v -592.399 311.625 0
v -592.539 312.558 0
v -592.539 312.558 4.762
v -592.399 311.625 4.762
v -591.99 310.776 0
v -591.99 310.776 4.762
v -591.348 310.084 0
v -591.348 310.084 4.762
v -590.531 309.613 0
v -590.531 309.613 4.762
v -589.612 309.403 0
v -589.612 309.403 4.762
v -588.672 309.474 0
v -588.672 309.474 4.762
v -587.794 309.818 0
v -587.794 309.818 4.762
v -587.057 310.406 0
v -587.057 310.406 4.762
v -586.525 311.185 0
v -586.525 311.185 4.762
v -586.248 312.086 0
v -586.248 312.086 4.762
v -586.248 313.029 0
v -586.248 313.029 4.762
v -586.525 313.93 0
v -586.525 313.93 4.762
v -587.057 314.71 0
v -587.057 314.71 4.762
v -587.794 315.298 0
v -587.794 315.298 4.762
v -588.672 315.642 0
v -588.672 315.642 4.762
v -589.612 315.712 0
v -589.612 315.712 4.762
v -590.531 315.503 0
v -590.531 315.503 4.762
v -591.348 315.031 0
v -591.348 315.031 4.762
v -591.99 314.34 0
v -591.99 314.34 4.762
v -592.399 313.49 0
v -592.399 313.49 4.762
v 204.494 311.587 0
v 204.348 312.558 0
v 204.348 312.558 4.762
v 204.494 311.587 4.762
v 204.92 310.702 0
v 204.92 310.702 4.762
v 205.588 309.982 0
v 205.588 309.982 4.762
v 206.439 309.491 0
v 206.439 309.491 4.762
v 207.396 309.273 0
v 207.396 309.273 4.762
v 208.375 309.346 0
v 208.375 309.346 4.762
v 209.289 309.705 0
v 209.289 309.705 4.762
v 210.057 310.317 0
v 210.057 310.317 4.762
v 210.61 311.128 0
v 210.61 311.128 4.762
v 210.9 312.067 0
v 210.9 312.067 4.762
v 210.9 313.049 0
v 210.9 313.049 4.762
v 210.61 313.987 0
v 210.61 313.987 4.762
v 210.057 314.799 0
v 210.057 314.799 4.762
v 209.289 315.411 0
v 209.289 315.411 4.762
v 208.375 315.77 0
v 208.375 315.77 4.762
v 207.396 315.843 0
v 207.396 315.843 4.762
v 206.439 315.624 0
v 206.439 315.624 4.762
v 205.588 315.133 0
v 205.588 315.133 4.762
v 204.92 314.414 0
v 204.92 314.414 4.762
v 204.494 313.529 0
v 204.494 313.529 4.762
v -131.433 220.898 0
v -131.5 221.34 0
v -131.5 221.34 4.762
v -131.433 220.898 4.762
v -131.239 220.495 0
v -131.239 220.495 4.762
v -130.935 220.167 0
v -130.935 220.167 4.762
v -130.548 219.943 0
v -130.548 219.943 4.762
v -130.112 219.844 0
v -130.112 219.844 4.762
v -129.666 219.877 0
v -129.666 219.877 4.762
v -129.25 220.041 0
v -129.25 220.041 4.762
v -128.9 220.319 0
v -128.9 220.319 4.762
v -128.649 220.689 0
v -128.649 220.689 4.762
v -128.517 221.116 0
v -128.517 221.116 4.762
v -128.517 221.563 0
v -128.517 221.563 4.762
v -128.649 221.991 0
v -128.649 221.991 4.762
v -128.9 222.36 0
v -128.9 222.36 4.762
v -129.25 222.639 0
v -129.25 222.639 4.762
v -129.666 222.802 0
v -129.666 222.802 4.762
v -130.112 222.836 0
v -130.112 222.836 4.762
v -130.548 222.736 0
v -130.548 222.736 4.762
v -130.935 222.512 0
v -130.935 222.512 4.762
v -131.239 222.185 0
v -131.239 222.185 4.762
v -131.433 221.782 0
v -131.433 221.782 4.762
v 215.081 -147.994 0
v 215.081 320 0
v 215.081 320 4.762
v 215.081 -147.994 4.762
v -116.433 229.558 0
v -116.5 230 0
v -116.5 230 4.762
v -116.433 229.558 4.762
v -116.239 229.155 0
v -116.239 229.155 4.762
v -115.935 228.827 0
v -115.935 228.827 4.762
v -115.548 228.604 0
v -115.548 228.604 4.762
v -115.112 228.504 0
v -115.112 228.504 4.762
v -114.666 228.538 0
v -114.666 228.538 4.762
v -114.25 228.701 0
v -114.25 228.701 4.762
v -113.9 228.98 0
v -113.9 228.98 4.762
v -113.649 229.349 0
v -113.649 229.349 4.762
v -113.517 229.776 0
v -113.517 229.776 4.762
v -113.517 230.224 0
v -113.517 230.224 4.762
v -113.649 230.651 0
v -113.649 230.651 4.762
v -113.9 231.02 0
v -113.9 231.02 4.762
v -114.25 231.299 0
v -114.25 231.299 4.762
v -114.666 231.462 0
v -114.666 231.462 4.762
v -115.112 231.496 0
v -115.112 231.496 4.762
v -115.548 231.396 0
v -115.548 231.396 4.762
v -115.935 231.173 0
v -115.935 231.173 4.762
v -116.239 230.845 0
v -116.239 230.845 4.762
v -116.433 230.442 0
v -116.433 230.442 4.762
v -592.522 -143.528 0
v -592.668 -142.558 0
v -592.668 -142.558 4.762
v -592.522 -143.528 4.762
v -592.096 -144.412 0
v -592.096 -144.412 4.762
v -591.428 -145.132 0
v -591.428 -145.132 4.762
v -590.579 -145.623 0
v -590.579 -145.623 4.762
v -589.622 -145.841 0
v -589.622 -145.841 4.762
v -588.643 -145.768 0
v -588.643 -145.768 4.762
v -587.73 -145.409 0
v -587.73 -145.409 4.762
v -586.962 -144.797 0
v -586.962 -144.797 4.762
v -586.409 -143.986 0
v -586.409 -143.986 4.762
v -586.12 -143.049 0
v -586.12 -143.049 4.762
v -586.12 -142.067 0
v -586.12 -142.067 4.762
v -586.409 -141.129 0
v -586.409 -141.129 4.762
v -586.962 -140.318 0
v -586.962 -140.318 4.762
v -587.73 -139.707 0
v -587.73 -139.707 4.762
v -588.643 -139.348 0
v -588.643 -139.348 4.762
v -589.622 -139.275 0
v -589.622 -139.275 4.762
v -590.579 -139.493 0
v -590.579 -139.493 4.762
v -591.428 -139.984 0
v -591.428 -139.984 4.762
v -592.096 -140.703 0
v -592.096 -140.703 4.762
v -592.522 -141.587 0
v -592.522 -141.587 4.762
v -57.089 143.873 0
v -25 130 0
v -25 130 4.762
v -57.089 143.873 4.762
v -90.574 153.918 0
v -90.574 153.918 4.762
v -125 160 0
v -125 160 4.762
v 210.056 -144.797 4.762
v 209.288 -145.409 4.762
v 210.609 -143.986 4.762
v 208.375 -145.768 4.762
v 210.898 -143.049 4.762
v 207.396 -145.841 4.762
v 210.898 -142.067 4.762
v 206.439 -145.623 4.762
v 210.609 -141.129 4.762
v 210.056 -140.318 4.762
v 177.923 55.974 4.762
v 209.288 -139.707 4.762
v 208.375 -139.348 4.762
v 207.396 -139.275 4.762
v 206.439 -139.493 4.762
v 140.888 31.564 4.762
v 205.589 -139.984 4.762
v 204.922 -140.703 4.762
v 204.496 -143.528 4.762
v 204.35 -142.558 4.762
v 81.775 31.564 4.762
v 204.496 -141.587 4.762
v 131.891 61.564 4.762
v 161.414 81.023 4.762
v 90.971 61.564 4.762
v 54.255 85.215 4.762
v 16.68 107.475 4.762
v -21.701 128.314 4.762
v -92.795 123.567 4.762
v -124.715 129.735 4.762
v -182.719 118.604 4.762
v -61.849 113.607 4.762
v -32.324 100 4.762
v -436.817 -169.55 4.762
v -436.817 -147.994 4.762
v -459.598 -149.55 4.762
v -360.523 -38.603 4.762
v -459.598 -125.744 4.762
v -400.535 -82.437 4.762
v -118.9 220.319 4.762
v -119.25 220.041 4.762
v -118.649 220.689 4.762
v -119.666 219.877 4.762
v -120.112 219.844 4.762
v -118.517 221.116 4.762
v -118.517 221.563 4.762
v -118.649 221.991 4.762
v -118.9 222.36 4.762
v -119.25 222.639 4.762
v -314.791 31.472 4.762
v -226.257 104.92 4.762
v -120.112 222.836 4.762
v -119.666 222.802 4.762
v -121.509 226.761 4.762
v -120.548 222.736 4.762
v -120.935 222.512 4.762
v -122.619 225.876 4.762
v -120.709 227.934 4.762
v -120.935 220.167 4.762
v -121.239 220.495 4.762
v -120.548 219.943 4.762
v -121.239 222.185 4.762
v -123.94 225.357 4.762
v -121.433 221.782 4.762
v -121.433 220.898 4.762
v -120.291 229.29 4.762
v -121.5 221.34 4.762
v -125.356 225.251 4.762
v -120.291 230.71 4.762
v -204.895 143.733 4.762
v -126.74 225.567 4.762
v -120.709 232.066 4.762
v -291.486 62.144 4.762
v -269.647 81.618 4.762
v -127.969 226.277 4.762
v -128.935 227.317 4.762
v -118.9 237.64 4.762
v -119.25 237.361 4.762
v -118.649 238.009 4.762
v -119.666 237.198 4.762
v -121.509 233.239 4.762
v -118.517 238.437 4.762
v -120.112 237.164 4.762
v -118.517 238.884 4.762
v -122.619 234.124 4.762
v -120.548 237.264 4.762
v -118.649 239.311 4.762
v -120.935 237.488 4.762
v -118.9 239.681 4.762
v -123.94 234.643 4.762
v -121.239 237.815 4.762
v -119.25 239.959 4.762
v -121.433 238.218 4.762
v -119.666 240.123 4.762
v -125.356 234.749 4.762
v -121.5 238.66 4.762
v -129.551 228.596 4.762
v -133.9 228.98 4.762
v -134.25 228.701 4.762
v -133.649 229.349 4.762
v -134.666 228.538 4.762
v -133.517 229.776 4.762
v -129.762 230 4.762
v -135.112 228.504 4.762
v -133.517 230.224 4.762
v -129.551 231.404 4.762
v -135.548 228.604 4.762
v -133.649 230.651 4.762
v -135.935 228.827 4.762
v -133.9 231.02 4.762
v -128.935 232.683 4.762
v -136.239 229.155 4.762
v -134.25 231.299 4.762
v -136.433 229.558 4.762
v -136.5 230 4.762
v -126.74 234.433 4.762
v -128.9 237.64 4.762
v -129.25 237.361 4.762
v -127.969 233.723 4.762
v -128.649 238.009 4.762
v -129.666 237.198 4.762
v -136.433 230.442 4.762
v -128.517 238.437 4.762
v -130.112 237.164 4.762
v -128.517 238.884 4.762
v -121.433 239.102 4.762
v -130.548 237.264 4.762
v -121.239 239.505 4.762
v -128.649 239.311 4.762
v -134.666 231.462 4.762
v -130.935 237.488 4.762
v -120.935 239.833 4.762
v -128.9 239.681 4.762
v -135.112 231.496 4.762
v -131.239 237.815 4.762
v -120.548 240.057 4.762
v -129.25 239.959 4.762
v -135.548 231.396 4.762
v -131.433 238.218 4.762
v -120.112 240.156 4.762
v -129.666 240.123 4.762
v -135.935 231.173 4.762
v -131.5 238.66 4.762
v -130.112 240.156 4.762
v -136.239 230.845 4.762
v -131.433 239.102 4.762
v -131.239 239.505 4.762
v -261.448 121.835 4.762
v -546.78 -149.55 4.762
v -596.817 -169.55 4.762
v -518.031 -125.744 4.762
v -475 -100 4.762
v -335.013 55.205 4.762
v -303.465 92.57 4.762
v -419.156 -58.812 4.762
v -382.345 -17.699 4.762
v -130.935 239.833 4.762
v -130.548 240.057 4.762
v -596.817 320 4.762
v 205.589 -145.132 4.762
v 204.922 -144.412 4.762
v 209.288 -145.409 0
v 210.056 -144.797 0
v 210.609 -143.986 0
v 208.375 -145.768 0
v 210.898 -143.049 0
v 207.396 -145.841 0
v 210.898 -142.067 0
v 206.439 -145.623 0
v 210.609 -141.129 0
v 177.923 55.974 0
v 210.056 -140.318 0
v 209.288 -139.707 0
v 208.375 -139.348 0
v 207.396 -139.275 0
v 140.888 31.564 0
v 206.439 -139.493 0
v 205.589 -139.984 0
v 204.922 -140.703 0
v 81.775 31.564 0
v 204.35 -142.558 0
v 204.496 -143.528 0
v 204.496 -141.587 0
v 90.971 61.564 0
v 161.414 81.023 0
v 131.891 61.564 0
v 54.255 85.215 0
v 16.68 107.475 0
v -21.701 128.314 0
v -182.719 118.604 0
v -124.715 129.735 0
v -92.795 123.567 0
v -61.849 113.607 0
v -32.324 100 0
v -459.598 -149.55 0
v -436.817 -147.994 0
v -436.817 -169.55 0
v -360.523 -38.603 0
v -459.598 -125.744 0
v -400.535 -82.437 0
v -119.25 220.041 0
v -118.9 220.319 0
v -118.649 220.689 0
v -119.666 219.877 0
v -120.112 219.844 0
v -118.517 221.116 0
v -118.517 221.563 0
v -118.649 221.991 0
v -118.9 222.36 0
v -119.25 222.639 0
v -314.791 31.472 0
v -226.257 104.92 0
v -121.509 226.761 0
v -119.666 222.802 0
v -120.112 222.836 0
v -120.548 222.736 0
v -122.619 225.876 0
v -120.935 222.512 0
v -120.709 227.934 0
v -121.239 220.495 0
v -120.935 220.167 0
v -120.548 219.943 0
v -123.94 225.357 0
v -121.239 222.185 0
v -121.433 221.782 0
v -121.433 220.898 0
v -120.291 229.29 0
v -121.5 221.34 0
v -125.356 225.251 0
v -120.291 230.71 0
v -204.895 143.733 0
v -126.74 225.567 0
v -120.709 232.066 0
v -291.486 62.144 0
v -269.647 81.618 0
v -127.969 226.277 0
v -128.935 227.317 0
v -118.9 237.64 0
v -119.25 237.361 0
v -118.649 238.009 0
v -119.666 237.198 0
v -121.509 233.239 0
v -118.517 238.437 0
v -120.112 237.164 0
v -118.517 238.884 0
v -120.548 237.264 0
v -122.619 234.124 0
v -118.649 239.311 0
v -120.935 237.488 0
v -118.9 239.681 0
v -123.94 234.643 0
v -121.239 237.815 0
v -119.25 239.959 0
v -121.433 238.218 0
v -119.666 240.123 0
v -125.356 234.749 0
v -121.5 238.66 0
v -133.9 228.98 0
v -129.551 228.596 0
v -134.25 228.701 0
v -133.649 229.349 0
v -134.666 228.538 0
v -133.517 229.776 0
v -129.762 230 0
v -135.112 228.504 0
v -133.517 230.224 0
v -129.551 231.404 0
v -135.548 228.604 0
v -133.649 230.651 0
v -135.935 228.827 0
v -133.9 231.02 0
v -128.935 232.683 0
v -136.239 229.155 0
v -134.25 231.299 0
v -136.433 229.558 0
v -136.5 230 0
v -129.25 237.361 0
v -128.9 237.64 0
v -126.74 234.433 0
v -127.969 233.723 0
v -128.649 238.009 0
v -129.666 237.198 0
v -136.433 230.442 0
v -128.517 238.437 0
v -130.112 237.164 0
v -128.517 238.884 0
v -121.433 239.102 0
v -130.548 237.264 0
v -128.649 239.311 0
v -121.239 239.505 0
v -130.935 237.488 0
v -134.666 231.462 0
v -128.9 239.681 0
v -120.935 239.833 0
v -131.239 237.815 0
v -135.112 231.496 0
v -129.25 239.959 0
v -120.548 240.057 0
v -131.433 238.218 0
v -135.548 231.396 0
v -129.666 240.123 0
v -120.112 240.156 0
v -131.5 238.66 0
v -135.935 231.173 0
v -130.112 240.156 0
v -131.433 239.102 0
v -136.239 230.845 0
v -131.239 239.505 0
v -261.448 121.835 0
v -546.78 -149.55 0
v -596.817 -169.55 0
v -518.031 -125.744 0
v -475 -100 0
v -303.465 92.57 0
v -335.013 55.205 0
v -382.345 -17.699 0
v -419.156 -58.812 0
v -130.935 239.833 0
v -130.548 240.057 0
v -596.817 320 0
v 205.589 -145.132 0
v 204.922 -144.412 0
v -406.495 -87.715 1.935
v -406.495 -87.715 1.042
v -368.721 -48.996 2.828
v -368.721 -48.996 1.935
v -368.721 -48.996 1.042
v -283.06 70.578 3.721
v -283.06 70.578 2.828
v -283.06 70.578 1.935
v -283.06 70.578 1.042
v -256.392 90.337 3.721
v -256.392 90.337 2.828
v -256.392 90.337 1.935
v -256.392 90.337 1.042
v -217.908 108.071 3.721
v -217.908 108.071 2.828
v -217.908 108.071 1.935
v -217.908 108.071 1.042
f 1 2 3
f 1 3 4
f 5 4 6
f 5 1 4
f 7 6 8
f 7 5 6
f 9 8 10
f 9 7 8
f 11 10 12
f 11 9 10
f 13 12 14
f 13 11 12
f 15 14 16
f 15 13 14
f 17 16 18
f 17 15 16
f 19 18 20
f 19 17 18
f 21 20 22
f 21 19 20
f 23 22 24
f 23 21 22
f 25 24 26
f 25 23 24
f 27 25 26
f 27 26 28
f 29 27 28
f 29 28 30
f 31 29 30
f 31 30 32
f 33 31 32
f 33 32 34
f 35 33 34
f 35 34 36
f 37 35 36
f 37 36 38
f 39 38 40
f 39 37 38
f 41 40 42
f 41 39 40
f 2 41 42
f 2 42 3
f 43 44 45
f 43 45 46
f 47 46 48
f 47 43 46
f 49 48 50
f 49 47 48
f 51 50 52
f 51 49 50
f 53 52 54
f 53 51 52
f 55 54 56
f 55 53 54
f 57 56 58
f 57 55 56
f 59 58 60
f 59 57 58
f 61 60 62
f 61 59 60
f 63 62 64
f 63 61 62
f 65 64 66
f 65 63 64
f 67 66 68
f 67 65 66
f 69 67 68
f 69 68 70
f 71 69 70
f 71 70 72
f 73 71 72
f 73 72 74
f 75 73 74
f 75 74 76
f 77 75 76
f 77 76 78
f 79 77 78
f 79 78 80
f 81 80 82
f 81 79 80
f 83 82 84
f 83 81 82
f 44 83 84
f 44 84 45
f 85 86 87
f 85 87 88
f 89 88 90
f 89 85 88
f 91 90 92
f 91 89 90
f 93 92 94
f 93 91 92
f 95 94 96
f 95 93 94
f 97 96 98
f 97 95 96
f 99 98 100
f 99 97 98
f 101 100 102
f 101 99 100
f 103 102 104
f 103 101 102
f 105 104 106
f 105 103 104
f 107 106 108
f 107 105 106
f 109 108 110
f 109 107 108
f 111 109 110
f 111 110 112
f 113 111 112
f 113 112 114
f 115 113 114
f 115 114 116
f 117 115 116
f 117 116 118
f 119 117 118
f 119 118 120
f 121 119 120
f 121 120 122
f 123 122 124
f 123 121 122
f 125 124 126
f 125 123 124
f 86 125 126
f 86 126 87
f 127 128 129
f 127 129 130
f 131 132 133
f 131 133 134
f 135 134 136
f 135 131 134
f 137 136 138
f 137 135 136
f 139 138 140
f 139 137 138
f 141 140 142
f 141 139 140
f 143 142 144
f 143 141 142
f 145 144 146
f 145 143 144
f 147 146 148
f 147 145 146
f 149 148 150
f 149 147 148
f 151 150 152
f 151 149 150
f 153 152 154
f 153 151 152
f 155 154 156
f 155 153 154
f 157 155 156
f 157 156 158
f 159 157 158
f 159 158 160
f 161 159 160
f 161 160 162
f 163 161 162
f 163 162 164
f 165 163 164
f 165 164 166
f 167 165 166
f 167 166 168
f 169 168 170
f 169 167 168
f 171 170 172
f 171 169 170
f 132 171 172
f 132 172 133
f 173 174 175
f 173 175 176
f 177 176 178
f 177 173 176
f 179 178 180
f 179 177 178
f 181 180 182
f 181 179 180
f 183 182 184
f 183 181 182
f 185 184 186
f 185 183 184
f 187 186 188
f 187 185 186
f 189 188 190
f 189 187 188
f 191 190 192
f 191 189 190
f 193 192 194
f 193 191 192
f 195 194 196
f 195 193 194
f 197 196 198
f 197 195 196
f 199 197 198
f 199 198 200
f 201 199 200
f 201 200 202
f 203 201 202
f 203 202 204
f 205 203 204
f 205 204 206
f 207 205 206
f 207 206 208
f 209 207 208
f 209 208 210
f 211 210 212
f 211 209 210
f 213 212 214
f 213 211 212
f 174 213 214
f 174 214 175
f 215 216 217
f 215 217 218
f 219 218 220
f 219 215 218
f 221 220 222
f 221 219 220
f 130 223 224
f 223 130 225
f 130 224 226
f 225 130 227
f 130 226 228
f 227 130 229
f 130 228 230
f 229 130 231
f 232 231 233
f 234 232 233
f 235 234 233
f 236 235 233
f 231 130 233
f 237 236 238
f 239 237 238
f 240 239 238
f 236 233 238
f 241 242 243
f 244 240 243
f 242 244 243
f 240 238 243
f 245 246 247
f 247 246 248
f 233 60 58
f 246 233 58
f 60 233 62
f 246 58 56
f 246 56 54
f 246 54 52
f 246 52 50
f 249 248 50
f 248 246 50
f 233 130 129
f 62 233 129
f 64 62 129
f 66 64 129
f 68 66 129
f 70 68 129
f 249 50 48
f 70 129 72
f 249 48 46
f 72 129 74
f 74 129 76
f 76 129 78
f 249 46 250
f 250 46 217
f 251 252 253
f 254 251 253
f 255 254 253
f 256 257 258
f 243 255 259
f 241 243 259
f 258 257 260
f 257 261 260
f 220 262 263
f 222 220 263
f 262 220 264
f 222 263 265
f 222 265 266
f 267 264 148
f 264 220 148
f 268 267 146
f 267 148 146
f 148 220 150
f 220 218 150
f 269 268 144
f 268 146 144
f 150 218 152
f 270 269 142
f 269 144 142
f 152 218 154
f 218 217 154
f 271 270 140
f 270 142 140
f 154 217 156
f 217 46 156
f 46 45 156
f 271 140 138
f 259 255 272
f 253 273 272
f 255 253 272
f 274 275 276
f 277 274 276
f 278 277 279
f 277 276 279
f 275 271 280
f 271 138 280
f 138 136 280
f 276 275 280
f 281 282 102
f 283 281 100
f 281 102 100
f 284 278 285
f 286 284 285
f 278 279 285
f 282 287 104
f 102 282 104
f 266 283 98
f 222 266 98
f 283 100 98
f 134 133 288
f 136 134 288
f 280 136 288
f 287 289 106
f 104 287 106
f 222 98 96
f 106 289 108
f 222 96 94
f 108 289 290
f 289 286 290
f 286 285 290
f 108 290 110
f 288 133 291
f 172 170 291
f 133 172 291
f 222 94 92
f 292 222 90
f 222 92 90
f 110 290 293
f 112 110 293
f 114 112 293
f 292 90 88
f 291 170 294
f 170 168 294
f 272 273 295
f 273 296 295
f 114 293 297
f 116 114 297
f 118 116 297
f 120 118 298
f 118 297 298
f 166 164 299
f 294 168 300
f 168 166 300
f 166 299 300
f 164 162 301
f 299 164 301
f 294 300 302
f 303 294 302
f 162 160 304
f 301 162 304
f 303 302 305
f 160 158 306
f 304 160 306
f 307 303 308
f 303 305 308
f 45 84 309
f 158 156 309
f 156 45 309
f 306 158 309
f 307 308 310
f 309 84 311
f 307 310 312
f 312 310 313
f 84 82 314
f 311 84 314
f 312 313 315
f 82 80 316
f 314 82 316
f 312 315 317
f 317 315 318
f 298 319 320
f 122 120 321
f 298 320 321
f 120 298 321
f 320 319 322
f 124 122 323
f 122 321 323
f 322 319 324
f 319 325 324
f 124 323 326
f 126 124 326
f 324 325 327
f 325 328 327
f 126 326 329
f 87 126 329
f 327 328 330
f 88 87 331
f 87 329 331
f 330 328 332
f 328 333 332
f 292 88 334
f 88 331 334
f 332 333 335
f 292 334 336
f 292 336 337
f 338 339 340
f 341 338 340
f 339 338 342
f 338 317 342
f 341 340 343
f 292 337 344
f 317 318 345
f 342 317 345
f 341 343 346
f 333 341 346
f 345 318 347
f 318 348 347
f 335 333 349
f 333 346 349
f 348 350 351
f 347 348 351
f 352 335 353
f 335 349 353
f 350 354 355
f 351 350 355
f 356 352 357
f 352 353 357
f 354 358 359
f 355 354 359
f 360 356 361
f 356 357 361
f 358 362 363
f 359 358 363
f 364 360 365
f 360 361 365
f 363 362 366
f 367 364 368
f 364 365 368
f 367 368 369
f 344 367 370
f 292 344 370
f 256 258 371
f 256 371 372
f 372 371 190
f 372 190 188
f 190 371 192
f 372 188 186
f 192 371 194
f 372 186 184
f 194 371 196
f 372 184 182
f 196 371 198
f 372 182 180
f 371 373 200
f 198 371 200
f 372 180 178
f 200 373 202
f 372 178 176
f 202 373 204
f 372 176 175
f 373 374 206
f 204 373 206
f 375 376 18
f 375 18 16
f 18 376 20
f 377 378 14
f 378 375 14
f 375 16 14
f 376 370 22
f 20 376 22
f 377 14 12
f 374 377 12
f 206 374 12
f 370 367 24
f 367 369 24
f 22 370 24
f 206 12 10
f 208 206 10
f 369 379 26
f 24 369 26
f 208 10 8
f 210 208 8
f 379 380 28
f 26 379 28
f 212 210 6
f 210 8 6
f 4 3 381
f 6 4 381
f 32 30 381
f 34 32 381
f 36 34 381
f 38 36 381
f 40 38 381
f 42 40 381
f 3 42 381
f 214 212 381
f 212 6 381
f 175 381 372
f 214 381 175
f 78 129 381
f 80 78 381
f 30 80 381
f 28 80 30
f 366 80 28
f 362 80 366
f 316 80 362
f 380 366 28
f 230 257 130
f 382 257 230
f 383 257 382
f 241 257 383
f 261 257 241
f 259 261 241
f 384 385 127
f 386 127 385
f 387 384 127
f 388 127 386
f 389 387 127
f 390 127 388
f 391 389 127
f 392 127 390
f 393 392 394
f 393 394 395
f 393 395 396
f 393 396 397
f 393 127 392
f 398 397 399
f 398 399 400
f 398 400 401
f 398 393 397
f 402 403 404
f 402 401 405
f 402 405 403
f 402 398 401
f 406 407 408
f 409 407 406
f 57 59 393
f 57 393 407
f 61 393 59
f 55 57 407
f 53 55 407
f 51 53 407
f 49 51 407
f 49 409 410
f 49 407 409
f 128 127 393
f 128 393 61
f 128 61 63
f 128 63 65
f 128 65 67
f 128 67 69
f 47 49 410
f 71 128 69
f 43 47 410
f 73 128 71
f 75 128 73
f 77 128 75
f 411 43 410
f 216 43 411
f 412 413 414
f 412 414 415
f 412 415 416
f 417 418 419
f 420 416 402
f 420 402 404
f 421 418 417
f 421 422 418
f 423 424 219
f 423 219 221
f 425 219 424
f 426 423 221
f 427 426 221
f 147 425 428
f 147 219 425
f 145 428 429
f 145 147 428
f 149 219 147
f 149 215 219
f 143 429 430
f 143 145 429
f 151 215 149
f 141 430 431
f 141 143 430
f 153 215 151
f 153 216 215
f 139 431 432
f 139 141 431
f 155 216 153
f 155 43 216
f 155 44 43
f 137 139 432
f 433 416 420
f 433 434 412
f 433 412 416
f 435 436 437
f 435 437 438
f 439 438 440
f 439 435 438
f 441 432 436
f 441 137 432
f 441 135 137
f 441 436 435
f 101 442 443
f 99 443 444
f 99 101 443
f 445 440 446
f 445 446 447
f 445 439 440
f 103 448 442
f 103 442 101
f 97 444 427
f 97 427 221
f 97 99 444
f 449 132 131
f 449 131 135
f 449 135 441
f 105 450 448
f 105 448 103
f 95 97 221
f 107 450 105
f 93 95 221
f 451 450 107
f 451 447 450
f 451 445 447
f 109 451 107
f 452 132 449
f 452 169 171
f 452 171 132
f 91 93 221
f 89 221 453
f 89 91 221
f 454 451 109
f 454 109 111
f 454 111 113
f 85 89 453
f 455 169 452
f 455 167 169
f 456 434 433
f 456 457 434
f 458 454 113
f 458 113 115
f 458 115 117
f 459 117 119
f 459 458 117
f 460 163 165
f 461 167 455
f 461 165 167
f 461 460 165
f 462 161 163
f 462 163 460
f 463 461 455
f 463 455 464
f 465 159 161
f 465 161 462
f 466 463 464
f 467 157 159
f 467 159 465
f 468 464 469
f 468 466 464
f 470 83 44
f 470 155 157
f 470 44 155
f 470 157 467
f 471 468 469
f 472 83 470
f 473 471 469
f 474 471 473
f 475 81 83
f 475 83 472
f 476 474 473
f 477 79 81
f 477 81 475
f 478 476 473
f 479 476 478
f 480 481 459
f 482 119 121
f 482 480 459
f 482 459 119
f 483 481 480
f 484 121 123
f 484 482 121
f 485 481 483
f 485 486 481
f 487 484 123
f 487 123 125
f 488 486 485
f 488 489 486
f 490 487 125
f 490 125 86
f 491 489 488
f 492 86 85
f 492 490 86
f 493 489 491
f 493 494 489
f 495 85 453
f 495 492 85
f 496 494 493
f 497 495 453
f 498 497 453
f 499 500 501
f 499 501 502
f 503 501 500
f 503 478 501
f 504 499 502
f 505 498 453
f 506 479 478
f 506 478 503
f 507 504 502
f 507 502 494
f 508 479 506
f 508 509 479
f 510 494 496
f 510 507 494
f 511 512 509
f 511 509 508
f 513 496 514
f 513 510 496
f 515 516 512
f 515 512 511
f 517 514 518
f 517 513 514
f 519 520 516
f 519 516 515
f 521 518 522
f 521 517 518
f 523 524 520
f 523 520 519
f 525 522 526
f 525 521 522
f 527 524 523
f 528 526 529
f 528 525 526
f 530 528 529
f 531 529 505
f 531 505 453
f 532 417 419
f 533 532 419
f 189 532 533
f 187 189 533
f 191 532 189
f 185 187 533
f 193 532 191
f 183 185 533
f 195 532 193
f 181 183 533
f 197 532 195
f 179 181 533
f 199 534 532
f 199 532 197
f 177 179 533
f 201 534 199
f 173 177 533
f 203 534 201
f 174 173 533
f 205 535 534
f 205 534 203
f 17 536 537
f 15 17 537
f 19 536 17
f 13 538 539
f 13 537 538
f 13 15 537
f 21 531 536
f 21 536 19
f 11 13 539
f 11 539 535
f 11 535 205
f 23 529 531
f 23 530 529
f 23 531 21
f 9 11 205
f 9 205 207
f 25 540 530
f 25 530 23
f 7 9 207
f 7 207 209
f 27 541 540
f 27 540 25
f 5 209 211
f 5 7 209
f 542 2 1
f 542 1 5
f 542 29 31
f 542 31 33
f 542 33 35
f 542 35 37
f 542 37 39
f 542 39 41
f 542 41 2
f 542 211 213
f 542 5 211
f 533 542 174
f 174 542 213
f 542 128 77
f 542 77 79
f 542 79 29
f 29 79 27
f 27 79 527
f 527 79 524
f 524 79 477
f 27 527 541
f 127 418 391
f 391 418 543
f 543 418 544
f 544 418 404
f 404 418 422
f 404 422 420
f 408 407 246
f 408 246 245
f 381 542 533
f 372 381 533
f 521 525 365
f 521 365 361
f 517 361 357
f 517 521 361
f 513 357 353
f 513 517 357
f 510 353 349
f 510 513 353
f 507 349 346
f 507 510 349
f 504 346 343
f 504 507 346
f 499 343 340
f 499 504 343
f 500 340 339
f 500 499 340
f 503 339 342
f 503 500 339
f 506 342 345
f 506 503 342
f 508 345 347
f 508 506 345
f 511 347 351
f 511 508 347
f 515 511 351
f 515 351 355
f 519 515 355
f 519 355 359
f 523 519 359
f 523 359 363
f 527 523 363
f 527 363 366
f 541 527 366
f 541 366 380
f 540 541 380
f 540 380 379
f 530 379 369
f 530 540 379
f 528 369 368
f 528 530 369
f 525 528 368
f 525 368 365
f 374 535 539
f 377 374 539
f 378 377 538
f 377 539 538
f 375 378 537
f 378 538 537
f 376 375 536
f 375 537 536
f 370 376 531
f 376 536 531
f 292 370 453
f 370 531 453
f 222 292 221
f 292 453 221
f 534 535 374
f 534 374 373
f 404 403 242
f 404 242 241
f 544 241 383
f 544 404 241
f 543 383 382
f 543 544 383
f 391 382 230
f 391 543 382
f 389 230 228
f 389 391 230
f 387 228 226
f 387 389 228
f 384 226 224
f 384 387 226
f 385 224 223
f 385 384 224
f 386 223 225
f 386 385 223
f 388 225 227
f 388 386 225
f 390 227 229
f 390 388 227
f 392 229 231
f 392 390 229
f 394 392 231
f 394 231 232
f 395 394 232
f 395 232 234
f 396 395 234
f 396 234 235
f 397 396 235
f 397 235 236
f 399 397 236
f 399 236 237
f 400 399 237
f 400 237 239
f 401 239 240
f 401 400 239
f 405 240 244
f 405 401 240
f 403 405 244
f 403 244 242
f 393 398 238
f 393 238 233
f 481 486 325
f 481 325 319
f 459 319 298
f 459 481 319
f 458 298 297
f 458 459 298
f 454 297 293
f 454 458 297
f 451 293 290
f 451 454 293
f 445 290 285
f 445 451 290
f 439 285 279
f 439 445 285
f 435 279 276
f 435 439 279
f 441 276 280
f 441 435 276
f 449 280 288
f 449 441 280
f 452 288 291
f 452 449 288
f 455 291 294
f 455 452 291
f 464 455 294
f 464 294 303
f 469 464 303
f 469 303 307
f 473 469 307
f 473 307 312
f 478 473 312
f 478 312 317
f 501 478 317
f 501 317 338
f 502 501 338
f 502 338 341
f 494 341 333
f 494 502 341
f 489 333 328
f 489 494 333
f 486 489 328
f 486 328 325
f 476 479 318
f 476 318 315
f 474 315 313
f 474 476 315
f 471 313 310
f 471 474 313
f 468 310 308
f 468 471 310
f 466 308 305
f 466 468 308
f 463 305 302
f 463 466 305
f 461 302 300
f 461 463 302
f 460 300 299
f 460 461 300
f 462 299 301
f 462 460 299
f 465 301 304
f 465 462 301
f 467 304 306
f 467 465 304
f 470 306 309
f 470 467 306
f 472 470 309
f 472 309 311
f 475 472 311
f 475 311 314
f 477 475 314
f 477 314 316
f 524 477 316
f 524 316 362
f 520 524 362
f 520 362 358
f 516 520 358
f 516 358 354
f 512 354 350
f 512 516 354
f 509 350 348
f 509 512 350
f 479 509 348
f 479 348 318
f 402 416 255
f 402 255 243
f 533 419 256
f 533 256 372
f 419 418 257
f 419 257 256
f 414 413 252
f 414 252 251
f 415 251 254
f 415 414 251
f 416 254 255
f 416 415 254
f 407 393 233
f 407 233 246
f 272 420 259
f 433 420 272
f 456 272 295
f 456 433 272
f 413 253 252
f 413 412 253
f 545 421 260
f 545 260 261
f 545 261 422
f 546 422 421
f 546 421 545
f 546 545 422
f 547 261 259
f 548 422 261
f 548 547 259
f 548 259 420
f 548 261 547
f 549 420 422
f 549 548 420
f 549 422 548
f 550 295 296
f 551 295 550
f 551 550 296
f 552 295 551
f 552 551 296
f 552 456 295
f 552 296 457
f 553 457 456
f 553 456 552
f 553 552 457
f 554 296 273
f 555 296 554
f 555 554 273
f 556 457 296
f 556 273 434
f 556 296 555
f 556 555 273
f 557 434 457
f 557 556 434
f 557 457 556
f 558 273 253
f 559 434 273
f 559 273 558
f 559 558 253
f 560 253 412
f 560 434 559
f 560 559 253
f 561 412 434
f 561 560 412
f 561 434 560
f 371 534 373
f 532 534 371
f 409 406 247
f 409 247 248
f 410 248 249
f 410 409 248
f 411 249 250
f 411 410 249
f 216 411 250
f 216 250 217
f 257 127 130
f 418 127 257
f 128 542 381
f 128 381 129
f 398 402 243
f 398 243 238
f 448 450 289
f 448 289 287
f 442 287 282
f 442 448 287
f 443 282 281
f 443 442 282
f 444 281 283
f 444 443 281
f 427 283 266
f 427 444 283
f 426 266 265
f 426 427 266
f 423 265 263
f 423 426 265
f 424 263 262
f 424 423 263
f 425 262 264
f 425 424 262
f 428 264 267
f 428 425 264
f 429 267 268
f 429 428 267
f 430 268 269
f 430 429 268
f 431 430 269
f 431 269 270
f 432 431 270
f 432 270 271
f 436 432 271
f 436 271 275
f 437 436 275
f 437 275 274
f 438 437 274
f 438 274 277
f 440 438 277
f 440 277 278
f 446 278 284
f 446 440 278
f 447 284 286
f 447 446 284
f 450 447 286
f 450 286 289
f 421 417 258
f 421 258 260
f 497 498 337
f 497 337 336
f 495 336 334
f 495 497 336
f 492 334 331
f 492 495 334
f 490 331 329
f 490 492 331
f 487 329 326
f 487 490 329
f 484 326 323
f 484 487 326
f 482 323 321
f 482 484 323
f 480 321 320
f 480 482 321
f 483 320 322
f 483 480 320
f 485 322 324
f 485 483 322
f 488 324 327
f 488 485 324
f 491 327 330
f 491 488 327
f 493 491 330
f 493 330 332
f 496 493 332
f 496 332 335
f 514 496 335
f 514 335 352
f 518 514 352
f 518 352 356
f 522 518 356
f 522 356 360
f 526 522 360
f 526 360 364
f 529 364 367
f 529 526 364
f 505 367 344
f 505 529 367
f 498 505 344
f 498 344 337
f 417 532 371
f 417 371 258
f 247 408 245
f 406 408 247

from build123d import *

# Parameters (mm, degrees)
SKETCH1_R           = 3.292374312
SKETCH1_R_2         = 3.294421934
SKETCH1_R_3         = 3.163533699
SKETCH1_R_4         = 1.5
SKETCH1_R_5         = 4.7625
BOSS_EXTRUDE1_DEPTH = 4.7625


with BuildPart() as part:
    # Sketch1 → Boss-Extrude1 (new body)
    with BuildSketch(Plane.XY):
        Polygon((-436.816755826, -147.994392447), (-436.816755826, -169.55039994), (-596.816755826, -169.55039994), (-596.816755826, -150), (-596.816755826, 320), (215.080766979, 320), (215.080766979, -147.994392447), align=None)
        with Locations(Location((-589.375723826, -142.5578, 0), (0, 0, 180))):
            Circle(SKETCH1_R, mode=Mode.SUBTRACT)
        with Locations(Location((207.642212326, -142.5578, 0), (0, 0, 180))):
            Circle(SKETCH1_R, mode=Mode.SUBTRACT)
        with Locations(Location((207.642212326, 312.5578, 0), (0, 0, 180))):
            Circle(SKETCH1_R_2, mode=Mode.SUBTRACT)
        with Locations(Location((-589.375723826, 312.5578, 0), (0, 0, 180))):
            Circle(SKETCH1_R_3, mode=Mode.SUBTRACT)
        with Locations(Location((-135, 230, 0), (0, 0, 180))):
            Circle(SKETCH1_R_4, mode=Mode.SUBTRACT)
        with Locations(Location((-130, 238.660254038, 0), (0, 0, 180))):
            Circle(SKETCH1_R_4, mode=Mode.SUBTRACT)
        with Locations(Location((-120, 238.660254038, 0), (0, 0, 180))):
            Circle(SKETCH1_R_4, mode=Mode.SUBTRACT)
        with Locations(Location((-115, 230, 0), (0, 0, 180))):
            Circle(SKETCH1_R_4, mode=Mode.SUBTRACT)
        with Locations(Location((-120, 221.339745962, 0), (0, 0, 180))):
            Circle(SKETCH1_R_4, mode=Mode.SUBTRACT)
        with Locations(Location((-130, 221.339745962, 0), (0, 0, 180))):
            Circle(SKETCH1_R_4, mode=Mode.SUBTRACT)
        with Locations(Location((-125, 230, 0), (0, 0, 180))):
            Circle(SKETCH1_R_5, mode=Mode.SUBTRACT)
        with BuildLine():
            Line((-475, -100), (-518.031074044, -125.74437106))
            Line((-518.031074044, -125.74437106), (-546.780363752, -149.55039994))
            Line((-546.780363752, -149.55039994), (-459.597813184, -149.55039994))
            Line((-459.597813184, -149.55039994), (-459.597813184, -125.74437106))
            add(Edge.make_bspline(
                [(-459.597813184, -125.74437106), (-458.129207209, -124.865742348), (-455.185829054, -123.081513508), (-449.471359557, -119.524654219), (-442.555549408, -115.046151368), (-434.636214281, -109.639746192), (-424.556425744, -102.386073958), (-412.829398694, -93.24529863), (-400.055778993, -82.1905419), (-388.486450966, -71.092190732), (-374.537420018, -56.304576734), (-359.620141336, -37.979207276), (-344.890774823, -16.767556206), (-332.340078528, 3.245699555), (-321.055163892, 21.796443272), (-310.225956981, 38.664819129), (-299.079604806, 53.834809894), (-286.812791685, 67.514642691), (-272.431751915, 80.088460877), (-257.652665703, 89.924055398), (-243.498210685, 97.442015492), (-231.565093385, 102.886615769), (-218.172694067, 108.112662921), (-203.190999217, 113.087836875), (-189.281720356, 116.996077726), (-177.243425929, 119.962936855), (-167.745823902, 122.104113686), (-157.766000623, 124.157339904), (-149.036898589, 125.791853127), (-141.799270328, 127.051772068), (-136.243143266, 127.972296195), (-131.502167372, 128.719120718), (-127.648712651, 129.303231945), (-125.690331117, 129.592450023), (-124.714693771, 129.734664734)],
                knots=[0, 0, 0, 0, 0.00777259, 0.01554518, 0.03109036, 0.04663554, 0.062180721, 0.093271081, 0.124361441, 0.155451801, 0.186542162, 0.248722882, 0.310903603, 0.373084323, 0.435265044, 0.497445764, 0.559626485, 0.621807206, 0.683987926, 0.746168647, 0.777259007, 0.808349367, 0.839439728, 0.870530088, 0.901620448, 0.917165628, 0.932710808, 0.948255989, 0.963801169, 0.971573759, 0.979346349, 0.987118939, 0.991005234, 0.994891529, 0.994891529, 0.994891529, 0.994891529], degree=3))
            ThreePointArc((-124.714693771, 129.734664734), (-77.172123272, 119.052933104), (-32.323699215, 100))
            Line((-32.323699215, 100), (81.77450832, 31.56416045))
            Line((81.77450832, 31.56416045), (140.88780849, 31.56416045))
            Line((140.88780849, 31.56416045), (177.923308763, 55.973921994))
            Line((177.923308763, 55.973921994), (161.413907899, 81.022668132))
            Line((161.413907899, 81.022668132), (131.890654865, 61.56416045))
            Line((131.890654865, 61.56416045), (90.97120992, 61.56416045))
            ThreePointArc((90.97120992, 61.56416045), (35.57180112, 96.520479224), (-21.701372103, 128.313911667))
            Line((-21.701372103, 128.313911667), (-25, 130))
            ThreePointArc((-25, 130), (-73.684930832, 149.383563894), (-125, 160))
            add(Edge.make_bspline(
                [(-475, -100), (-419.540575809, -66.820070684), (-329.590802121, 43.11603253), (-307.635554762, 134.287094016), (-125, 160)],
                knots=[0, 0, 0, 0, 0.312223899, 1, 1, 1, 1], degree=3))
        make_face(mode=Mode.SUBTRACT)
    extrude(amount=BOSS_EXTRUDE1_DEPTH)


solid = part.part
